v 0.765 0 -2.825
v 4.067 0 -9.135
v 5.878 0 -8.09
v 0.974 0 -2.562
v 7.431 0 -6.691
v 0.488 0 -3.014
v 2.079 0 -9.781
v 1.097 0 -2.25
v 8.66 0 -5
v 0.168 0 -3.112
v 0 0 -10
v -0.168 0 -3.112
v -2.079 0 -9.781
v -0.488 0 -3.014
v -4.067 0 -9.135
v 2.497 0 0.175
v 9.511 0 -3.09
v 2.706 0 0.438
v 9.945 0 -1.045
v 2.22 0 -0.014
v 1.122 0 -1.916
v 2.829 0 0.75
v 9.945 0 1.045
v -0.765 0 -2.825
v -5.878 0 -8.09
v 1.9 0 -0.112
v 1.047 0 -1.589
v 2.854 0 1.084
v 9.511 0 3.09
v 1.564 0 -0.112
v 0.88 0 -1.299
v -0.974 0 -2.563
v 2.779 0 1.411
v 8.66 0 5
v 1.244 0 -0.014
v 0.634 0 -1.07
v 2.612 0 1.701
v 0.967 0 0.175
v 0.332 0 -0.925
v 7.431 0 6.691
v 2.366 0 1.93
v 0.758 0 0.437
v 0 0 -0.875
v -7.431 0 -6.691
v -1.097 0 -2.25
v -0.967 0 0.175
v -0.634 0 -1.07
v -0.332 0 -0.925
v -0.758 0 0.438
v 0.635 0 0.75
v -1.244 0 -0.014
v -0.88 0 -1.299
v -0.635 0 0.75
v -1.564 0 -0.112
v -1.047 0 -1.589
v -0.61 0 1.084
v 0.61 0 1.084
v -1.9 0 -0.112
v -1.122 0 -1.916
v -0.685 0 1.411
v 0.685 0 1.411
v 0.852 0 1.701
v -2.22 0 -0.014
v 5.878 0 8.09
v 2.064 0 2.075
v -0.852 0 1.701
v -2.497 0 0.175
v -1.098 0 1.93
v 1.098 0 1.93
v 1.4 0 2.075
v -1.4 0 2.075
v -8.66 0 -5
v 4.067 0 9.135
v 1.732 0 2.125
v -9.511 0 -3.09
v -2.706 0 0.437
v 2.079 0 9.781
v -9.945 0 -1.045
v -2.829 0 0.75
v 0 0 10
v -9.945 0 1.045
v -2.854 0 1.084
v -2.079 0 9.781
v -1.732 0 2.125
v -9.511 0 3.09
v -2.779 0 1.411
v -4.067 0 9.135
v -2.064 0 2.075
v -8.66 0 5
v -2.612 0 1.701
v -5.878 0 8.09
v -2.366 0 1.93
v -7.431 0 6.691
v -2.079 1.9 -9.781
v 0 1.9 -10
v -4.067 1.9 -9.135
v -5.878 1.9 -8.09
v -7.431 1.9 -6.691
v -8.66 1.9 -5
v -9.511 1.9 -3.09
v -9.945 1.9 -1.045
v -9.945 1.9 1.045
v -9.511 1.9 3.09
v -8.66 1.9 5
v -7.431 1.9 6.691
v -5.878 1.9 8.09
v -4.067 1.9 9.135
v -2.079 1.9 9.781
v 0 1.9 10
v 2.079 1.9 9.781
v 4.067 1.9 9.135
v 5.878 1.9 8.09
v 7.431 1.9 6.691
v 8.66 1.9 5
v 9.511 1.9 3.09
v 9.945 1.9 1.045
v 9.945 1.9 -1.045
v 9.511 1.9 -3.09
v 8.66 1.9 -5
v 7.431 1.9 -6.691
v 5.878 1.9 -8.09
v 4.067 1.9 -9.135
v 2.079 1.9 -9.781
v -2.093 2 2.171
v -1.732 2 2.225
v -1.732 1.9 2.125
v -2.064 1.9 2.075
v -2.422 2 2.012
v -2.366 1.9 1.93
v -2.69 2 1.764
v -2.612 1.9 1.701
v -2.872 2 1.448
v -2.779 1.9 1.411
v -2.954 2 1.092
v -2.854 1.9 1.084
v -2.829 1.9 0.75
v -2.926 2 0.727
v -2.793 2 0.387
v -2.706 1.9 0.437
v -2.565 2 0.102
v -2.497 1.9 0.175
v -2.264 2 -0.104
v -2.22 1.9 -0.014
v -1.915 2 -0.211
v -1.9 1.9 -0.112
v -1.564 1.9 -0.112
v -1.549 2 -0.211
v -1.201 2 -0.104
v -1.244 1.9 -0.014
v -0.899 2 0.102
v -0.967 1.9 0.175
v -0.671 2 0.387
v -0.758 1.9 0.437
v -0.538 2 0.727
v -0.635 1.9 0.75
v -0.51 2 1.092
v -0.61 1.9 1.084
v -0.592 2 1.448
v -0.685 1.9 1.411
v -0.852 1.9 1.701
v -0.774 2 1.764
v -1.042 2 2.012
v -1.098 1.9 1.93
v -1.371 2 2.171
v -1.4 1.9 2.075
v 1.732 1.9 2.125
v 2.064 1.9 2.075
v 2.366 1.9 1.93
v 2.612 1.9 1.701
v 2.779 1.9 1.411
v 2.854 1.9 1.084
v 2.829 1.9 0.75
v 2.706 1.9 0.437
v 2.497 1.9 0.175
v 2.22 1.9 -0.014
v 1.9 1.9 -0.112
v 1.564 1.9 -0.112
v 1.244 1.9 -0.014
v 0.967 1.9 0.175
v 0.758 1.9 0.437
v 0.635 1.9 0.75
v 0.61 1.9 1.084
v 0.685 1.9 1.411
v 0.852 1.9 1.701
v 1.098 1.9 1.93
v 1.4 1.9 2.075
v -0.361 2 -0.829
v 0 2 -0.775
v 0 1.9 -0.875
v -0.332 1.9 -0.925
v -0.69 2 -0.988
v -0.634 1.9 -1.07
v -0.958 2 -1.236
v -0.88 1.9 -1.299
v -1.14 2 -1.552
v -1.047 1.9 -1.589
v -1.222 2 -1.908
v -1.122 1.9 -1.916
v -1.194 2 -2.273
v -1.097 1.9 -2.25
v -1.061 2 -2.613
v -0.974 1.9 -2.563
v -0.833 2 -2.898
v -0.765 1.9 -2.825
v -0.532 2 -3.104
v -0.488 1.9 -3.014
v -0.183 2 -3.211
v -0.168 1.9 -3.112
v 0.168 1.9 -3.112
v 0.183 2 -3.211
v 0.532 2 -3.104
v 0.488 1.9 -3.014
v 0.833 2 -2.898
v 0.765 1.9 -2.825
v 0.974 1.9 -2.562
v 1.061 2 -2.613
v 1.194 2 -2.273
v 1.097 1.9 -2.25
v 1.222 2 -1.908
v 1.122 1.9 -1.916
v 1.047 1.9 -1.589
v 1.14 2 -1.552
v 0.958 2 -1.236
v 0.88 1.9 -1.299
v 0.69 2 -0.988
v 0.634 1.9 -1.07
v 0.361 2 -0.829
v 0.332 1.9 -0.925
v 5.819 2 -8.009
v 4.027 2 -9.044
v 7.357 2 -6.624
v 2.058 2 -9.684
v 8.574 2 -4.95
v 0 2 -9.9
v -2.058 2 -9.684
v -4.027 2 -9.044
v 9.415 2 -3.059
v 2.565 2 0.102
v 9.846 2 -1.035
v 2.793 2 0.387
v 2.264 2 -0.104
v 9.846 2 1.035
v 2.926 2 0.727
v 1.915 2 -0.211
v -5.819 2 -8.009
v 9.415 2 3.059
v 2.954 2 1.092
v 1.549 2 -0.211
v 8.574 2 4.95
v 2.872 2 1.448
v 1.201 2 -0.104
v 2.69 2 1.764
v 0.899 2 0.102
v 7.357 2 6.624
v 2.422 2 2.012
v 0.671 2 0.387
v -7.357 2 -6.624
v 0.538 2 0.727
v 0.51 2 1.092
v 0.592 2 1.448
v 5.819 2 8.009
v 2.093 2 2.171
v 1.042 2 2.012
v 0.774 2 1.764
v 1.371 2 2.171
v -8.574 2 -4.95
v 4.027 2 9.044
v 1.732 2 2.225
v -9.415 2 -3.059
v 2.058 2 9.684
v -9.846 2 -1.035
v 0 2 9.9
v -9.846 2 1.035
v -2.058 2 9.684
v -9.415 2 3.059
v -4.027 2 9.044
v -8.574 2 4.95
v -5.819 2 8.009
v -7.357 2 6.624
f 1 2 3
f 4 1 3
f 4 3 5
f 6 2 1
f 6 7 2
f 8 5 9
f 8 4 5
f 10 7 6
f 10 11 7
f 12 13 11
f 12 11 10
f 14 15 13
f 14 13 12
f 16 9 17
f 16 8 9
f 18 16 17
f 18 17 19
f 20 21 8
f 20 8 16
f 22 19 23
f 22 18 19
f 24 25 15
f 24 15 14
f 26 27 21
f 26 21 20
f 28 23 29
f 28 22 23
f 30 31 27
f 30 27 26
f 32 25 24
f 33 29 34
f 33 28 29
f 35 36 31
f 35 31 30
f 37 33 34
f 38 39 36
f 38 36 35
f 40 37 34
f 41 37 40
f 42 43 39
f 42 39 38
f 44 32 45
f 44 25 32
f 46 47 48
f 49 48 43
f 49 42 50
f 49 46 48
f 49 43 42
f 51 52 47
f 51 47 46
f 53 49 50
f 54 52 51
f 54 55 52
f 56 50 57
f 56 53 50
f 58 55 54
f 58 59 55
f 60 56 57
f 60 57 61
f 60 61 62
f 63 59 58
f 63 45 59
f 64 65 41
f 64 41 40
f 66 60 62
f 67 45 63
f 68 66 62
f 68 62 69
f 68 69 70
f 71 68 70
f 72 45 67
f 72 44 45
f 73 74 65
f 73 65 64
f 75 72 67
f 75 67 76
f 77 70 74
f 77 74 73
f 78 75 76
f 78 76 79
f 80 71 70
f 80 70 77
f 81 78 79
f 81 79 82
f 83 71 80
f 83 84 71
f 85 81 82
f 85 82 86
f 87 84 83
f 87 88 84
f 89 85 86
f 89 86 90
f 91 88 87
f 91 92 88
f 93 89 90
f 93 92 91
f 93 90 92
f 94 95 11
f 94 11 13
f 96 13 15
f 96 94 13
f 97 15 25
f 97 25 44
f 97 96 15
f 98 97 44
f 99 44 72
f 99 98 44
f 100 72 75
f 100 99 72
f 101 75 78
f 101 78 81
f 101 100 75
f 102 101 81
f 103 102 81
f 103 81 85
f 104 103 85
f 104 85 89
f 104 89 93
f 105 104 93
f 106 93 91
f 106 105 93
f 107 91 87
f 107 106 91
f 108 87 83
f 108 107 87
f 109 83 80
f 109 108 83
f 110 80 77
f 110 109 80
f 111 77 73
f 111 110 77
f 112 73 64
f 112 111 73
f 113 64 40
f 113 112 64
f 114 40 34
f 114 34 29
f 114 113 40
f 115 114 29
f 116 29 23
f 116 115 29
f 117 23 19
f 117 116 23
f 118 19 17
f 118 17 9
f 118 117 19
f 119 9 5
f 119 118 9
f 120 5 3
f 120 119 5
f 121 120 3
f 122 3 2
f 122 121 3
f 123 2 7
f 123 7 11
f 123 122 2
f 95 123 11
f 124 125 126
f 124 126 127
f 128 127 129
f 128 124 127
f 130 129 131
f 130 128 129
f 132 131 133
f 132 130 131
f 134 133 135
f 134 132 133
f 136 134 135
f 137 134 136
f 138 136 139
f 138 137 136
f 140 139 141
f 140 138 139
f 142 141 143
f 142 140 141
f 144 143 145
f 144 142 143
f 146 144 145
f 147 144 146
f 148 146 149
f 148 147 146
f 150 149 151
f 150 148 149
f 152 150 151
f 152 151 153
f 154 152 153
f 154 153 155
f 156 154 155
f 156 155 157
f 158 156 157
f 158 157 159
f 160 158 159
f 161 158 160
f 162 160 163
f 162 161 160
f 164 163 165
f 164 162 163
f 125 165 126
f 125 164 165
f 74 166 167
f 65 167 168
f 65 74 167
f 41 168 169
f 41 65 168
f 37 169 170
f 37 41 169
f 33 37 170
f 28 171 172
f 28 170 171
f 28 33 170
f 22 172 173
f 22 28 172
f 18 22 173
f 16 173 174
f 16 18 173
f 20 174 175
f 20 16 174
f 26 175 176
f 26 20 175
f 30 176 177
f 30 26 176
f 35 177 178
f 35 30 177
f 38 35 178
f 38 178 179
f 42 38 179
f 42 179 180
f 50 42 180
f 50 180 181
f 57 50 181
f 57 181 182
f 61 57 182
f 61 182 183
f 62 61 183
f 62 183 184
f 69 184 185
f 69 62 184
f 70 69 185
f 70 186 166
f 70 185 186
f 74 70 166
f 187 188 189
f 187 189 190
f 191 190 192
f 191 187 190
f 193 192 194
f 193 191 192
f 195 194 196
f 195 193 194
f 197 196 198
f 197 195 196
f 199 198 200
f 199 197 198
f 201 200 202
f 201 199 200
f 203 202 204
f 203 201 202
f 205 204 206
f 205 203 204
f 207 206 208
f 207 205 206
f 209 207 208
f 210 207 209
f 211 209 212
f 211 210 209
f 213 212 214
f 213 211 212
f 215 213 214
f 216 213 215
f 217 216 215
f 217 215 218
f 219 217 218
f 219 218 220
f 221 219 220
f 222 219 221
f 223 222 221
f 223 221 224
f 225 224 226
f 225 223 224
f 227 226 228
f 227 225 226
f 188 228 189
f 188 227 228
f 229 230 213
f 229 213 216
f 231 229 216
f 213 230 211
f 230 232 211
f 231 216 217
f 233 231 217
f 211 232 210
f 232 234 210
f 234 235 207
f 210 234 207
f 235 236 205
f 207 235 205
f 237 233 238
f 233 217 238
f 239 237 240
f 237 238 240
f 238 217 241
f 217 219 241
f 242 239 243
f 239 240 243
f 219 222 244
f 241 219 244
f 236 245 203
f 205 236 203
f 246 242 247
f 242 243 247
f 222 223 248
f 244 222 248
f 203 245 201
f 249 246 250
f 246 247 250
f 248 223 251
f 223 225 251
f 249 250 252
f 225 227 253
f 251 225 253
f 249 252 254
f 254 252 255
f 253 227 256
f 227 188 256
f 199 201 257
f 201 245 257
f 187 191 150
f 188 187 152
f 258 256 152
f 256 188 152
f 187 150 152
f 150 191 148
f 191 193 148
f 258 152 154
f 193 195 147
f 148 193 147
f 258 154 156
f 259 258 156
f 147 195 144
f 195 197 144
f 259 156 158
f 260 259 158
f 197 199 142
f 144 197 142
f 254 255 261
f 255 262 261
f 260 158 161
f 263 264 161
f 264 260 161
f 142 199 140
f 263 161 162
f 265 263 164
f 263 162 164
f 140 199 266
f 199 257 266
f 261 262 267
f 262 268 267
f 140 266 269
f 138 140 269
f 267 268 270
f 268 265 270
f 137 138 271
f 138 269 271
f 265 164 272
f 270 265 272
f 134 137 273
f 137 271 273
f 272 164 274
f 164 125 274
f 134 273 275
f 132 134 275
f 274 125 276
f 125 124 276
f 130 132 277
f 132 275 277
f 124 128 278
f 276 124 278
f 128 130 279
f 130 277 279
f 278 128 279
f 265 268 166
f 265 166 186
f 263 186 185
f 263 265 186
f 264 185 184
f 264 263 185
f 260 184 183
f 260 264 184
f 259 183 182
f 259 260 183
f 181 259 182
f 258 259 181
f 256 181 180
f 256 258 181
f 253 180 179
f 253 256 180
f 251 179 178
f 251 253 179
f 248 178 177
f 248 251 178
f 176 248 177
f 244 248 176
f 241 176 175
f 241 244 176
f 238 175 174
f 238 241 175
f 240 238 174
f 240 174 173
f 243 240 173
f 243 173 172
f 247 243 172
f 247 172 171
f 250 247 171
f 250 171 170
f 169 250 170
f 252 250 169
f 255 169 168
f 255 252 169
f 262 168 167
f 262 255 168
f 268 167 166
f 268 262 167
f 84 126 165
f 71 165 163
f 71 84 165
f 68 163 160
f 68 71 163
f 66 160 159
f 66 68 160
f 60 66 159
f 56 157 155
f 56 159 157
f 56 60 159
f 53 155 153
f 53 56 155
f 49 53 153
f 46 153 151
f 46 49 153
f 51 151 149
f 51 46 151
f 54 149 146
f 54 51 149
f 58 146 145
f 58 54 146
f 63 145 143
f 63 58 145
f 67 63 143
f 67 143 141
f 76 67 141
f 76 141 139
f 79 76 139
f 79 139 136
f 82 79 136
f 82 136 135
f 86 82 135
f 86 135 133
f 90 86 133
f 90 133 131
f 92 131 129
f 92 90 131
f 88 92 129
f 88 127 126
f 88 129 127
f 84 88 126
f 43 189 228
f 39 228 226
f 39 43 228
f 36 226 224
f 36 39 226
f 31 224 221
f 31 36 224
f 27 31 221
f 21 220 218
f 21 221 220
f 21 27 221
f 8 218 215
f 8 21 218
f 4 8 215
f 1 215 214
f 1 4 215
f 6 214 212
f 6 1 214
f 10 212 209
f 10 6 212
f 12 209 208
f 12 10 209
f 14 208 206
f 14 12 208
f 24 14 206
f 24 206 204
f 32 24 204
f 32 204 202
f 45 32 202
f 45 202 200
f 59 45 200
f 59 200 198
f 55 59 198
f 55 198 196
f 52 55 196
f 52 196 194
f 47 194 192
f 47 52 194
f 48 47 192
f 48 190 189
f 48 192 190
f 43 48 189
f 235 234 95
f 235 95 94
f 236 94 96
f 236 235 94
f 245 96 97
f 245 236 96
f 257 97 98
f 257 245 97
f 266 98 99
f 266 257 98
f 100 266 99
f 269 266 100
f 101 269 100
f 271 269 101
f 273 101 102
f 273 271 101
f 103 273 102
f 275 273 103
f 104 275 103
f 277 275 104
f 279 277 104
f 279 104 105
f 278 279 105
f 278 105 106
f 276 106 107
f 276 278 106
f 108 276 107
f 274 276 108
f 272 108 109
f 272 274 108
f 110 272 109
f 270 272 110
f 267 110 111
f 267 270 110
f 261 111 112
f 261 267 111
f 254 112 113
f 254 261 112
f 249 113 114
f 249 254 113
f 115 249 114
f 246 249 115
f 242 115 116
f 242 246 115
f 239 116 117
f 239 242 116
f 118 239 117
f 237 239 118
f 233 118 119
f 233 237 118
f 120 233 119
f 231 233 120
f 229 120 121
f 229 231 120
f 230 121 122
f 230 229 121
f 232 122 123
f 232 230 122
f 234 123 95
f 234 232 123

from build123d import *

# Parameters (mm, degrees)
SKETCH1_W          = 10
SKETCH1_H          = 2
SKETCH2_R          = 1.125
CUT_EXTRUDE1_DEPTH = 15.282856857
CHAMFER2_SIZE      = 0.1


with BuildPart() as part:
    # Sketch1 → Revolve1 (revolve)
    with BuildSketch(Plane.XY, mode=Mode.PRIVATE) as revolve1_sk:
        with Locations((5, 1)):
            Rectangle(SKETCH1_W, SKETCH1_H)
    revolve(revolve1_sk.sketch.rotate(Axis((0, 0, 0), (0, 1, 0)), 90), axis=Axis((0, 0, 0), (0, 1, 0)))

    # Sketch2 → Cut-Extrude1 (cut, through all)
    with BuildSketch(Plane(origin=(0, 0, 0), x_dir=(1, 0, 0), z_dir=(0, 1, 0))):
        with Locations(Location((-1.732050808, -1, 0), (0, 0, 270))):
            Circle(SKETCH2_R)
        with Locations(Location((1.732050808, -1, 0), (0, 0, 270))):
            Circle(SKETCH2_R)
        with Locations(Location((0, 2, 0), (0, 0, 270))):
            Circle(SKETCH2_R)
    extrude(amount=CUT_EXTRUDE1_DEPTH, mode=Mode.SUBTRACT)

    # Chamfer2
    chamfer2_edges = [part.edges().sort_by_distance(p)[0] for p in [
        (0, 2, -3.125),
        (-1.732050808, 2, -0.125),
        (1.732050808, 2, -0.125),
        (0, 2, 10),
    ]]
    chamfer(chamfer2_edges, length=CHAMFER2_SIZE)


solid = part.part
